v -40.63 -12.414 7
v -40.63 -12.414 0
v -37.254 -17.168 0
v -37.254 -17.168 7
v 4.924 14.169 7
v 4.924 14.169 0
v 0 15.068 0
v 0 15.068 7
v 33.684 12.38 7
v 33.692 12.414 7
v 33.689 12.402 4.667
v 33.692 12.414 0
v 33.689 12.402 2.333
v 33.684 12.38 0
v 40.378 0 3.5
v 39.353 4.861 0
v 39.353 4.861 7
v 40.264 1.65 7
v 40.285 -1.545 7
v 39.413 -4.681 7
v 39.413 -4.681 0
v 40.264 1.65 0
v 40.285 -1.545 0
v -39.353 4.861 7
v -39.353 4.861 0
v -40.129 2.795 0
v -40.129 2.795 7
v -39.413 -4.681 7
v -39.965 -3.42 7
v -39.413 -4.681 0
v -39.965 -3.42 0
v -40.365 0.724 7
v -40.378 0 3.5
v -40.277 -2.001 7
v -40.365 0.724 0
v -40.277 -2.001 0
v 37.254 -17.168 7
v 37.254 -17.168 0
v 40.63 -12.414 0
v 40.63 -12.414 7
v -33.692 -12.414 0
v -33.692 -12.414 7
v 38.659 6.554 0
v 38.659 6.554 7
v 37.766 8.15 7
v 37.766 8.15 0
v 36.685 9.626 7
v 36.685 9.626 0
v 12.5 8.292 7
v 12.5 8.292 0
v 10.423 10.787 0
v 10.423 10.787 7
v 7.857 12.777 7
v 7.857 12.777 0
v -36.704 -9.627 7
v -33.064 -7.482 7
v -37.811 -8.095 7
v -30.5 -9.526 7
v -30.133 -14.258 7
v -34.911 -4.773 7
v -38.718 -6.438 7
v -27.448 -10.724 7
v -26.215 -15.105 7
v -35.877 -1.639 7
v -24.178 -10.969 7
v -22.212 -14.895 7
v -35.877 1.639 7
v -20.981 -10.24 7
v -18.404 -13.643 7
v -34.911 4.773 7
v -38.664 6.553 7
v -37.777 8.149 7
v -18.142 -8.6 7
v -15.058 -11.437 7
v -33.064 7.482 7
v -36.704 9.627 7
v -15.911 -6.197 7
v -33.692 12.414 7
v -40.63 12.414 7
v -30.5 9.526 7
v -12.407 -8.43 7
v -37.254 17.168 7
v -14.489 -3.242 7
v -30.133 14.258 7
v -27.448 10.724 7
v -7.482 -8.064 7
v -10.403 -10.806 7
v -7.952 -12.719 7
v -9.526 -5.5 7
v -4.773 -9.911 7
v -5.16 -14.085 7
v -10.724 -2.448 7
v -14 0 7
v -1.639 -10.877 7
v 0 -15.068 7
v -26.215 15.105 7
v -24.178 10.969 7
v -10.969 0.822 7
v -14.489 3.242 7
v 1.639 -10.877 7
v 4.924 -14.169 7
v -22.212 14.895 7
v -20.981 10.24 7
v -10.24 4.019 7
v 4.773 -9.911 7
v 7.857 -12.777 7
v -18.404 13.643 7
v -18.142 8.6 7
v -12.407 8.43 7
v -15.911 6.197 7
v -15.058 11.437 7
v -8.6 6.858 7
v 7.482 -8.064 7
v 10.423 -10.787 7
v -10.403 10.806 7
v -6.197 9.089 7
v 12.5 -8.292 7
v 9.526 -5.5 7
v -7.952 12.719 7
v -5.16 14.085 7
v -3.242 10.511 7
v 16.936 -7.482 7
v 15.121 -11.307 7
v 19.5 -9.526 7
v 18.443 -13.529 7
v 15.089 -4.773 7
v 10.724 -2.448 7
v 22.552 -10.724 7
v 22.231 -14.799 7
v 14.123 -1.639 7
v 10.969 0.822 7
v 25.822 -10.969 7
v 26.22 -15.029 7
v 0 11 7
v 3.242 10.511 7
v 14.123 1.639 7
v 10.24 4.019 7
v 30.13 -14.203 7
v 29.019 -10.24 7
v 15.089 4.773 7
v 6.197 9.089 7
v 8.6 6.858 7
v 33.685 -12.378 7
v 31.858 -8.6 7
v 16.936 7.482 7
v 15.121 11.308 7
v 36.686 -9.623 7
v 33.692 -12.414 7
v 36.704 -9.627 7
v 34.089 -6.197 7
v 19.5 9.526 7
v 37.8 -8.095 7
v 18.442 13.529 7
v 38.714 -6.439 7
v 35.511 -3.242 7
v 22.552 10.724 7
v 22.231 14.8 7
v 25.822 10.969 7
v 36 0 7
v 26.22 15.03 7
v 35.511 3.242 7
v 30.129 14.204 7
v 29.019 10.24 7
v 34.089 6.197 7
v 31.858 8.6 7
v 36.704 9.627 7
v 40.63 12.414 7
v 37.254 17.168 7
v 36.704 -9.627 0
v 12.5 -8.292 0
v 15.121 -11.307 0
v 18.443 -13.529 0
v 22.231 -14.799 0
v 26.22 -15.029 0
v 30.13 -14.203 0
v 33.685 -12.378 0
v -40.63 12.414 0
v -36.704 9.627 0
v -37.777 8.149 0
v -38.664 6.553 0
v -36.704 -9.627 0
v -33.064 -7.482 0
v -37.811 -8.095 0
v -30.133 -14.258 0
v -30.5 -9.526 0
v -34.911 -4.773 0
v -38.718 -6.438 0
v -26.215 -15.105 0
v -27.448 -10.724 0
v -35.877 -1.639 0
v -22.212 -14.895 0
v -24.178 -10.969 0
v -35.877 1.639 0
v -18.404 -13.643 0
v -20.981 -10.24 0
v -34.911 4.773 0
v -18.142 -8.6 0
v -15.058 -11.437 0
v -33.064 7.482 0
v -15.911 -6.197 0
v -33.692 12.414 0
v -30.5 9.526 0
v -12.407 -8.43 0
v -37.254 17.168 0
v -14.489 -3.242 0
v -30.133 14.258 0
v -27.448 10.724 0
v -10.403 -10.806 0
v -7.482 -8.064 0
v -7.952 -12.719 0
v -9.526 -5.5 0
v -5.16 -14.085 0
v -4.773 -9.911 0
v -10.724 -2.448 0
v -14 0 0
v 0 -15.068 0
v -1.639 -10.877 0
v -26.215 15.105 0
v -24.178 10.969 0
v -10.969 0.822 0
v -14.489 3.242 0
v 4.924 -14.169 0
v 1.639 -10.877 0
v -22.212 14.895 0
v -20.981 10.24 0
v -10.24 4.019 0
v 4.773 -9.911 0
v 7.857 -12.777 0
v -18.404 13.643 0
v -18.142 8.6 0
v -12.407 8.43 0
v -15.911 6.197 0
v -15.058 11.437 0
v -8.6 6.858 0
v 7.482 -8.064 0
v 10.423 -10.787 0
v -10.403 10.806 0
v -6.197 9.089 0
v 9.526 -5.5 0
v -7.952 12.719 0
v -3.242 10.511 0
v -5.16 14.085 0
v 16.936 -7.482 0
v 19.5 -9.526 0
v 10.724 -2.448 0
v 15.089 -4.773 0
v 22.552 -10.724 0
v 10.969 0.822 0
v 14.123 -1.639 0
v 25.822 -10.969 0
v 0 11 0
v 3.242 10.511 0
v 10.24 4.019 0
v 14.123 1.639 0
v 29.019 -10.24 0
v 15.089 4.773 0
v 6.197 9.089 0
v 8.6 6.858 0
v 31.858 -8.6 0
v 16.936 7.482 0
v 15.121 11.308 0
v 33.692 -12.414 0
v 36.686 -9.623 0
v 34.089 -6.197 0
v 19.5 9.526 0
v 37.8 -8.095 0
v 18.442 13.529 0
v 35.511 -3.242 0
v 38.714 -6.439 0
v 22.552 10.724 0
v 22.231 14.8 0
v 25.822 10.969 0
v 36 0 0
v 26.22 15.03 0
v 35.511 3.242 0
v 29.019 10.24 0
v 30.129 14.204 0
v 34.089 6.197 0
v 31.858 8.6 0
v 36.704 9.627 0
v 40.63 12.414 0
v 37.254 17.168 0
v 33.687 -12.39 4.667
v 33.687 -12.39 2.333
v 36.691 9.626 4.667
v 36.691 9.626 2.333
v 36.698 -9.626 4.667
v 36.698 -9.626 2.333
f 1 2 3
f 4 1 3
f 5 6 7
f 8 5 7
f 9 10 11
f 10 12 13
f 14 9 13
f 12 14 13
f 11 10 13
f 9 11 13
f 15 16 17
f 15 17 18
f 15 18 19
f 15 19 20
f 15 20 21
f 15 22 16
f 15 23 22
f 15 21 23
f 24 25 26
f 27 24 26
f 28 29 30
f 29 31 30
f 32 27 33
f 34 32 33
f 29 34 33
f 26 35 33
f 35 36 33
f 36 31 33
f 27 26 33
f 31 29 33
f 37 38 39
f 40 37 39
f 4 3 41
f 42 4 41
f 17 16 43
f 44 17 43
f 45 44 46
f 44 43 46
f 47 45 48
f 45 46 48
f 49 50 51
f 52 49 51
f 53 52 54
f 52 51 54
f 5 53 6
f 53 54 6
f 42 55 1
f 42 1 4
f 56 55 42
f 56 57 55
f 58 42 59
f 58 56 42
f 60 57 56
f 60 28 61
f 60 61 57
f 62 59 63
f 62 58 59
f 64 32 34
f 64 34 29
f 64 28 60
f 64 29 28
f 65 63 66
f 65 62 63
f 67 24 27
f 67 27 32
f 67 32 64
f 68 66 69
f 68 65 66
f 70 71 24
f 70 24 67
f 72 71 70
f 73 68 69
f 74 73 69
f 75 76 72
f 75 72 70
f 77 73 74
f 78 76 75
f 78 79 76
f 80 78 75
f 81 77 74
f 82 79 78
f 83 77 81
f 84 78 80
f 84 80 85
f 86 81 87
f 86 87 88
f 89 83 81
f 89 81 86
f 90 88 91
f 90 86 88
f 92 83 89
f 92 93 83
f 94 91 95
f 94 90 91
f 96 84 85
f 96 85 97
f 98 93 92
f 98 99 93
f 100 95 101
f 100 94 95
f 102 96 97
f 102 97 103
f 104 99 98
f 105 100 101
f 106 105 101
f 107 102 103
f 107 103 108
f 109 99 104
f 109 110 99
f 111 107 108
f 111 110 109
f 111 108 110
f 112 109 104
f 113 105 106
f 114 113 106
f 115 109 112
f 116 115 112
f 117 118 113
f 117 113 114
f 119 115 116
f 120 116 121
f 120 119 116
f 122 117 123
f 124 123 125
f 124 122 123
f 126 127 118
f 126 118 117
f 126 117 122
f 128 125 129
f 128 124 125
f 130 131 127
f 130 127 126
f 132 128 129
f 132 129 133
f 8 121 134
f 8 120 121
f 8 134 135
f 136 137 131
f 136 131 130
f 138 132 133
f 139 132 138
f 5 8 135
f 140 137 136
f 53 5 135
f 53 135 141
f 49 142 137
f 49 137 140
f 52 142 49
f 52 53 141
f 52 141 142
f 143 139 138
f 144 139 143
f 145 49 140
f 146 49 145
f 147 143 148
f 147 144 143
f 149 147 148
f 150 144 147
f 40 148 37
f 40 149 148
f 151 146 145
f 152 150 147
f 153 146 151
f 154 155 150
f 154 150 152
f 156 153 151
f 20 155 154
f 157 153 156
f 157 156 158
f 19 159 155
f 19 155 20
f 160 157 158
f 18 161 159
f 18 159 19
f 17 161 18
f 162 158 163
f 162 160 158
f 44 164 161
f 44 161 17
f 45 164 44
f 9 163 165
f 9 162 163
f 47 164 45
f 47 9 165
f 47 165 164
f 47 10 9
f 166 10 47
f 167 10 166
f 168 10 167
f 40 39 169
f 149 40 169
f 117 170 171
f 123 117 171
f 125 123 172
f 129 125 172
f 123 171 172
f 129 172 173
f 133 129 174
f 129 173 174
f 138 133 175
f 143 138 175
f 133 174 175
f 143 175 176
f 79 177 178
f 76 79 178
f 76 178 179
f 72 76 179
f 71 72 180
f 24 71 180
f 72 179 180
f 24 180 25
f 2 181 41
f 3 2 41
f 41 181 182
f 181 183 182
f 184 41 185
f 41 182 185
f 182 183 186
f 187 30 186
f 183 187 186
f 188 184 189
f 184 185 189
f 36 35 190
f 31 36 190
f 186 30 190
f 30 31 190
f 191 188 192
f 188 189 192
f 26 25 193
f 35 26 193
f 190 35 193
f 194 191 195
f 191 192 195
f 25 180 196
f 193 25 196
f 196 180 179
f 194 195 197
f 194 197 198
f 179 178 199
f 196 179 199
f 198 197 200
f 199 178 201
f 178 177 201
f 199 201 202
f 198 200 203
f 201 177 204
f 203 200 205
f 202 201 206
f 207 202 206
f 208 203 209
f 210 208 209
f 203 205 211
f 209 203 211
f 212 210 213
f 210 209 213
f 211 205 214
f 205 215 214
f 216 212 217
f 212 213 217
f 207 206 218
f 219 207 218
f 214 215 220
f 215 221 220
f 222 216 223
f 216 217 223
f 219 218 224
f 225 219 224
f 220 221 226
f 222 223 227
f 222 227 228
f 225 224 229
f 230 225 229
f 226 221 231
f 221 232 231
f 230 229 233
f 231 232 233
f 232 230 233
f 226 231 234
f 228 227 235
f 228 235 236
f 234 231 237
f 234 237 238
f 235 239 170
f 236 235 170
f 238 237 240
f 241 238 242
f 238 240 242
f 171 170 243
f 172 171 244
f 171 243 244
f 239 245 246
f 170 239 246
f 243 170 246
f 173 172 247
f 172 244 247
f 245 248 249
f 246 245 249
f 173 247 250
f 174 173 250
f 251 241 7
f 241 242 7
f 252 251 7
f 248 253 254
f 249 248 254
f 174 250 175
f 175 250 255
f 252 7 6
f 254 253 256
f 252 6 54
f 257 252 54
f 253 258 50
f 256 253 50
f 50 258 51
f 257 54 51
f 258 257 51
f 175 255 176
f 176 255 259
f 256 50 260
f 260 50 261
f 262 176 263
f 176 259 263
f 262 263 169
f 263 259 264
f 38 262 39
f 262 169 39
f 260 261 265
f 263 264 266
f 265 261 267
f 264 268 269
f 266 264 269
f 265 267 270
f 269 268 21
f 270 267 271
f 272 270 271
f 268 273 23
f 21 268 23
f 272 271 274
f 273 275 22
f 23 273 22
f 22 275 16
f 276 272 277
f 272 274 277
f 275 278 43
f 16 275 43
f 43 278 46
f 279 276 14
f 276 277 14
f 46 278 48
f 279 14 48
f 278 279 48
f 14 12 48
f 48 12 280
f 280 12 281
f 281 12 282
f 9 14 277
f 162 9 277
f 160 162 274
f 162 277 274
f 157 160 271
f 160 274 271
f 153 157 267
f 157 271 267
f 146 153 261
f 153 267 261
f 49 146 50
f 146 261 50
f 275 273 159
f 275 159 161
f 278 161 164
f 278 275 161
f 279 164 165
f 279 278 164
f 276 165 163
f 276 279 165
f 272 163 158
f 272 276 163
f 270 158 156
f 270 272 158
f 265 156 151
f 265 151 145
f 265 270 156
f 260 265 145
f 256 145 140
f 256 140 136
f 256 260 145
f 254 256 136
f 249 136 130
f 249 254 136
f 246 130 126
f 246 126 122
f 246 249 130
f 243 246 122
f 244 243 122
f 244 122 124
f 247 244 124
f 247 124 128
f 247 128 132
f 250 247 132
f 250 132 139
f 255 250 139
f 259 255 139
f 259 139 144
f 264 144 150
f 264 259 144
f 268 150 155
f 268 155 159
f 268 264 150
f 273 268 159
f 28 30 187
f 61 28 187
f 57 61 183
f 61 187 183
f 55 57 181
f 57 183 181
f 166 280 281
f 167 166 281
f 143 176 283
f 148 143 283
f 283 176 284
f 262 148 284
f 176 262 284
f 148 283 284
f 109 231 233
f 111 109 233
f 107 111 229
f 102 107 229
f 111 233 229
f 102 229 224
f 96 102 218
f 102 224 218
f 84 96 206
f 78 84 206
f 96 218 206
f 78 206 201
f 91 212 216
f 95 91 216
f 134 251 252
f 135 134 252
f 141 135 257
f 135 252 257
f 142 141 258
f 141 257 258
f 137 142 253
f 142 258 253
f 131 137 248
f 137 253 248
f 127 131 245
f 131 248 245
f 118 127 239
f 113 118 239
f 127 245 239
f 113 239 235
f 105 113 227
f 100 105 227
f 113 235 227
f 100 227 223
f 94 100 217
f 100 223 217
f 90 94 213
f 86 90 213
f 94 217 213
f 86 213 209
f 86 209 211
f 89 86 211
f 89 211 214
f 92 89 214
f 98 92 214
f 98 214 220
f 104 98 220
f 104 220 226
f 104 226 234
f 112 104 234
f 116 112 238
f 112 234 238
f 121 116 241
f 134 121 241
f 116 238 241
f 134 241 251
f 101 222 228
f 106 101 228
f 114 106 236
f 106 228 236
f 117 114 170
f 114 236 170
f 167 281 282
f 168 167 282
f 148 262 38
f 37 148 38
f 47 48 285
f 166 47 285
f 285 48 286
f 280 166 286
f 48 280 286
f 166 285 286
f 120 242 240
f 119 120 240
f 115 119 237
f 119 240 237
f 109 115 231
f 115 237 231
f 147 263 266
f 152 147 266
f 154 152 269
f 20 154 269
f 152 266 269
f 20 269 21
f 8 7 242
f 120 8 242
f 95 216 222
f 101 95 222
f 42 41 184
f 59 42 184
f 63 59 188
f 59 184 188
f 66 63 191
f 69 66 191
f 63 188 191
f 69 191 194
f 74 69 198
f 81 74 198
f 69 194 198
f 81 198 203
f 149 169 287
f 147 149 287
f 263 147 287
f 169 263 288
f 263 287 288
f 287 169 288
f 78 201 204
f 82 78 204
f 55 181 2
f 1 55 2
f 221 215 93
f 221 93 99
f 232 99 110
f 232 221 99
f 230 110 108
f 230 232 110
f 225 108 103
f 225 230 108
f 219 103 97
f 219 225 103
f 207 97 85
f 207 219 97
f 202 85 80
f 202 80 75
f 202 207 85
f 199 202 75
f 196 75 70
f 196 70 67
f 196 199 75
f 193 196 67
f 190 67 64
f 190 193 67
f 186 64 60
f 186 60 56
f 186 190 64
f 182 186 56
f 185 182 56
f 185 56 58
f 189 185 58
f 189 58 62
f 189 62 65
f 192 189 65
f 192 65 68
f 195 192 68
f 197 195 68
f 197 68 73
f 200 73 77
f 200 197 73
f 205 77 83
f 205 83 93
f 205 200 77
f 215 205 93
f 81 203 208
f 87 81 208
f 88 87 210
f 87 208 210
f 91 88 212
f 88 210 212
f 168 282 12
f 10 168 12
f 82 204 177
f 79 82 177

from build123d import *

# Parameters (mm, degrees)
F0_R     = 11
F1_DEPTH = 7


# Not quite as in the source:
# - a feature of the source that left no trace in its solid (it failed there, or was rolled back) is left out


with BuildPart() as f1:
    # F0 (on Top) → F1 (new body)
    with BuildSketch(Plane.XY):
        with BuildLine():
            ThreePointArc((-33.6919065778, -12.4136305481), (-22.2121981946, -14.8954900703), (-12.4070507332, -8.4300113941))
            ThreePointArc((-12.4070507332, -8.4300113941), (-9.2272824926, -11.8261260691), (-5.1598693222, -14.0845925954))
            Line((-5.1598693222, -14.0845925954), (0, -15.0684863329))
            Line((0, -15.0684863329), (4.9237644598, -14.1688582301))
            ThreePointArc((4.9237644598, -14.1688582301), (9.1941581889, -11.851896692), (12.5, -8.2915619759))
            ThreePointArc((12.5, -8.2915619759), (22.2312035836, -14.7988434658), (33.6847114379, -12.378472956))
            add(Edge.make_bspline(
                [(36.6861147035, -9.6232201138), (35.4322184653, -9.3782649416), (32.9856759013, -8.9056095075), (33.4504308992, -11.233519818), (33.6847114379, -12.378472956)],
                knots=[0.0023635799, 0.0023635799, 0.0023635799, 0.0023635799, 0.5096931431, 0.9950324973, 0.9950324973, 0.9950324973, 0.9950324973], degree=3))
            ThreePointArc((36.6861147035, -9.6232201138), (38.2829241904, -7.281044503), (39.4129405486, -4.6813041007))
            add(Edge.make_bspline(
                [(39.3532489974, 4.8612453714), (40.0640178656, 3.2496024167), (40.675386779, 0.0090485332), (40.094980448, -3.1441618112), (39.4129405486, -4.6813041007)],
                knots=[0, 0, 0, 0, 0.5048307155, 1, 1, 1, 1], degree=3))
            ThreePointArc((39.3532489974, 4.8612453714), (38.2366644679, 7.3653393625), (36.6849282767, 9.6257292672))
            add(Edge.make_bspline(
                [(33.6844640266, 12.3797240959), (33.4791642411, 11.4442056961), (33.0552816759, 9.4534774659), (35.4207112642, 9.5639432605), (36.6849282767, 9.6257292672)],
                knots=[0.0055976008, 0.0055976008, 0.0055976008, 0.0055976008, 0.4689523637, 0.9973928627, 0.9973928627, 0.9973928627, 0.9973928627], degree=3))
            ThreePointArc((33.6844640266, 12.3797240959), (22.2307373346, 14.7998328025), (12.4996432587, 8.2920997584))
            ThreePointArc((12.4996432587, 8.2920997584), (9.1939032334, 11.8520944704), (4.9237644598, 14.1688582301))
            Line((4.9237644598, 14.1688582301), (0, 15.0684863329))
            Line((0, 15.0684863329), (-5.1598693222, 14.0845925954))
            ThreePointArc((-5.1598693222, 14.0845925954), (-9.2272824926, 11.8261260691), (-12.4070507332, 8.4300113941))
            ThreePointArc((-12.4070507332, 8.4300113941), (-22.2121981946, 14.8954900703), (-33.6919065778, 12.4136305481))
            Line((-33.6919065778, 12.4136305481), (-37.2543297708, 17.1683672816))
            Line((-37.2543297708, 17.1683672816), (-40.6296290457, 12.4136305481))
            Line((-40.6296290457, 12.4136305481), (-36.703640056, 9.6266439002))
            ThreePointArc((-36.703640056, 9.6266439002), (-38.2445317988, 7.3640913066), (-39.3532489974, 4.8612453714))
            add(Edge.make_bspline(
                [(-39.3532489974, 4.8612453714), (-40.2528289587, 3.2490634103), (-40.4878486023, 0.0095823751), (-40.2812252759, -3.1446904889), (-39.4129405486, -4.6813041007)],
                knots=[0, 0, 0, 0, 0.5048307155, 1, 1, 1, 1], degree=3))
            ThreePointArc((-39.4129405486, -4.6813041007), (-38.2903364161, -7.2811002801), (-36.703640056, -9.6266439002))
            Line((-36.703640056, -9.6266439002), (-40.6296290457, -12.4136305481))
            Line((-40.6296290457, -12.4136305481), (-37.2543297708, -17.1683672816))
            Line((-37.2543297708, -17.1683672816), (-33.6919065778, -12.4136305481))
        make_face()
        with Locations((-25, 0)):
            Circle(F0_R, mode=Mode.SUBTRACT)
        with BuildLine():
            ThreePointArc((0, -11), (-11, 0), (0, 11))
            ThreePointArc((0, 11), (11, 0), (0, -11))
        make_face(mode=Mode.SUBTRACT)
        with Locations((25, 0)):
            Circle(F0_R, mode=Mode.SUBTRACT)
        with BuildLine():
            ThreePointArc((33.8754488345, -12.2437849019), (33.7803409626, -12.3114982961), (33.6847114379, -12.378472956))
            add(Edge.make_bspline(
                [(33.6847114379, -12.378472956), (33.6871093254, -12.3901916797), (33.6895079516, -12.4019111139), (33.6919065778, -12.4136305481)],
                knots=[0.9950324973, 0.9950324973, 0.9950324973, 0.9950324973, 1, 1, 1, 1], degree=3))
            Line((33.6919065778, -12.4136305481), (33.8754488345, -12.2437849019))
        make_face()
        with BuildLine():
            add(Edge.make_bspline(
                [(36.6861147035, -9.6232201138), (35.4322184653, -9.3782649416), (32.9856759013, -8.9056095075), (33.4504308992, -11.233519818), (33.6847114379, -12.378472956)],
                knots=[0.0023635799, 0.0023635799, 0.0023635799, 0.0023635799, 0.5096931431, 0.9950324973, 0.9950324973, 0.9950324973, 0.9950324973], degree=3))
            ThreePointArc((33.6847114379, -12.378472956), (33.7803409626, -12.3114982961), (33.8754488345, -12.2437849019))
            Line((33.8754488345, -12.2437849019), (33.6919065778, -12.4136305481))
            Line((33.6919065778, -12.4136305481), (37.2543297708, -17.1683672816))
            Line((37.2543297708, -17.1683672816), (40.6296290457, -12.4136305481))
            Line((40.6296290457, -12.4136305481), (36.703640056, -9.6266439002))
            Line((36.703640056, -9.6266439002), (36.6135832636, -9.7099803175))
            ThreePointArc((36.6135832636, -9.7099803175), (36.6499303523, -9.6666682398), (36.6861147035, -9.6232201138))
        make_face()
        with BuildLine():
            add(Edge.make_bspline(
                [(36.703640056, -9.6266439002), (36.6977982463, -9.6255026135), (36.6919564367, -9.6243613269), (36.6861147035, -9.6232201138)],
                knots=[0, 0, 0, 0, 0.0023635799, 0.0023635799, 0.0023635799, 0.0023635799], degree=3))
            ThreePointArc((36.6861147035, -9.6232201138), (36.6499303523, -9.6666682398), (36.6135832636, -9.7099803175))
            Line((36.6135832636, -9.7099803175), (36.703640056, -9.6266439002))
        make_face()
        with BuildLine():
            ThreePointArc((36.6176990871, 9.7061716321), (36.6513836228, 9.6660089023), (36.6849282767, 9.6257292672))
            add(Edge.make_bspline(
                [(36.6849282767, 9.6257292672), (36.6911654734, 9.6260340973), (36.6974027647, 9.6263389988), (36.703640056, 9.6266439002)],
                knots=[0.9973928627, 0.9973928627, 0.9973928627, 0.9973928627, 1, 1, 1, 1], degree=3))
            Line((36.703640056, 9.6266439002), (36.6176990871, 9.7061716321))
        make_face()
        with BuildLine():
            add(Edge.make_bspline(
                [(33.6844640266, 12.3797240959), (33.4791642411, 11.4442056961), (33.0552816759, 9.4534774659), (35.4207112642, 9.5639432605), (36.6849282767, 9.6257292672)],
                knots=[0.0055976008, 0.0055976008, 0.0055976008, 0.0055976008, 0.4689523637, 0.9973928627, 0.9973928627, 0.9973928627, 0.9973928627], degree=3))
            ThreePointArc((36.6849282767, 9.6257292672), (36.6513836228, 9.6660089023), (36.6176990871, 9.7061716321))
            Line((36.6176990871, 9.7061716321), (36.703640056, 9.6266439002))
            Line((36.703640056, 9.6266439002), (40.6296290457, 12.4136305481))
            Line((40.6296290457, 12.4136305481), (37.2543297708, 17.1683672816))
            Line((37.2543297708, 17.1683672816), (33.6919065778, 12.4136305481))
            Line((33.6919065778, 12.4136305481), (33.8702569567, 12.2485893424))
            ThreePointArc((33.8702569567, 12.2485893424), (33.777607815, 12.3145071292), (33.6844640266, 12.3797240959))
        make_face()
        with BuildLine():
            add(Edge.make_bspline(
                [(33.6919065778, 12.4136305481), (33.6894253739, 12.4023281311), (33.68694417, 12.391025714), (33.6844640266, 12.3797240959)],
                knots=[0, 0, 0, 0, 0.0055976008, 0.0055976008, 0.0055976008, 0.0055976008], degree=3))
            ThreePointArc((33.6844640266, 12.3797240959), (33.777607815, 12.3145071292), (33.8702569567, 12.2485893424))
            Line((33.8702569567, 12.2485893424), (33.6919065778, 12.4136305481))
        make_face()
    extrude(amount=F1_DEPTH)


solid = f1.part
